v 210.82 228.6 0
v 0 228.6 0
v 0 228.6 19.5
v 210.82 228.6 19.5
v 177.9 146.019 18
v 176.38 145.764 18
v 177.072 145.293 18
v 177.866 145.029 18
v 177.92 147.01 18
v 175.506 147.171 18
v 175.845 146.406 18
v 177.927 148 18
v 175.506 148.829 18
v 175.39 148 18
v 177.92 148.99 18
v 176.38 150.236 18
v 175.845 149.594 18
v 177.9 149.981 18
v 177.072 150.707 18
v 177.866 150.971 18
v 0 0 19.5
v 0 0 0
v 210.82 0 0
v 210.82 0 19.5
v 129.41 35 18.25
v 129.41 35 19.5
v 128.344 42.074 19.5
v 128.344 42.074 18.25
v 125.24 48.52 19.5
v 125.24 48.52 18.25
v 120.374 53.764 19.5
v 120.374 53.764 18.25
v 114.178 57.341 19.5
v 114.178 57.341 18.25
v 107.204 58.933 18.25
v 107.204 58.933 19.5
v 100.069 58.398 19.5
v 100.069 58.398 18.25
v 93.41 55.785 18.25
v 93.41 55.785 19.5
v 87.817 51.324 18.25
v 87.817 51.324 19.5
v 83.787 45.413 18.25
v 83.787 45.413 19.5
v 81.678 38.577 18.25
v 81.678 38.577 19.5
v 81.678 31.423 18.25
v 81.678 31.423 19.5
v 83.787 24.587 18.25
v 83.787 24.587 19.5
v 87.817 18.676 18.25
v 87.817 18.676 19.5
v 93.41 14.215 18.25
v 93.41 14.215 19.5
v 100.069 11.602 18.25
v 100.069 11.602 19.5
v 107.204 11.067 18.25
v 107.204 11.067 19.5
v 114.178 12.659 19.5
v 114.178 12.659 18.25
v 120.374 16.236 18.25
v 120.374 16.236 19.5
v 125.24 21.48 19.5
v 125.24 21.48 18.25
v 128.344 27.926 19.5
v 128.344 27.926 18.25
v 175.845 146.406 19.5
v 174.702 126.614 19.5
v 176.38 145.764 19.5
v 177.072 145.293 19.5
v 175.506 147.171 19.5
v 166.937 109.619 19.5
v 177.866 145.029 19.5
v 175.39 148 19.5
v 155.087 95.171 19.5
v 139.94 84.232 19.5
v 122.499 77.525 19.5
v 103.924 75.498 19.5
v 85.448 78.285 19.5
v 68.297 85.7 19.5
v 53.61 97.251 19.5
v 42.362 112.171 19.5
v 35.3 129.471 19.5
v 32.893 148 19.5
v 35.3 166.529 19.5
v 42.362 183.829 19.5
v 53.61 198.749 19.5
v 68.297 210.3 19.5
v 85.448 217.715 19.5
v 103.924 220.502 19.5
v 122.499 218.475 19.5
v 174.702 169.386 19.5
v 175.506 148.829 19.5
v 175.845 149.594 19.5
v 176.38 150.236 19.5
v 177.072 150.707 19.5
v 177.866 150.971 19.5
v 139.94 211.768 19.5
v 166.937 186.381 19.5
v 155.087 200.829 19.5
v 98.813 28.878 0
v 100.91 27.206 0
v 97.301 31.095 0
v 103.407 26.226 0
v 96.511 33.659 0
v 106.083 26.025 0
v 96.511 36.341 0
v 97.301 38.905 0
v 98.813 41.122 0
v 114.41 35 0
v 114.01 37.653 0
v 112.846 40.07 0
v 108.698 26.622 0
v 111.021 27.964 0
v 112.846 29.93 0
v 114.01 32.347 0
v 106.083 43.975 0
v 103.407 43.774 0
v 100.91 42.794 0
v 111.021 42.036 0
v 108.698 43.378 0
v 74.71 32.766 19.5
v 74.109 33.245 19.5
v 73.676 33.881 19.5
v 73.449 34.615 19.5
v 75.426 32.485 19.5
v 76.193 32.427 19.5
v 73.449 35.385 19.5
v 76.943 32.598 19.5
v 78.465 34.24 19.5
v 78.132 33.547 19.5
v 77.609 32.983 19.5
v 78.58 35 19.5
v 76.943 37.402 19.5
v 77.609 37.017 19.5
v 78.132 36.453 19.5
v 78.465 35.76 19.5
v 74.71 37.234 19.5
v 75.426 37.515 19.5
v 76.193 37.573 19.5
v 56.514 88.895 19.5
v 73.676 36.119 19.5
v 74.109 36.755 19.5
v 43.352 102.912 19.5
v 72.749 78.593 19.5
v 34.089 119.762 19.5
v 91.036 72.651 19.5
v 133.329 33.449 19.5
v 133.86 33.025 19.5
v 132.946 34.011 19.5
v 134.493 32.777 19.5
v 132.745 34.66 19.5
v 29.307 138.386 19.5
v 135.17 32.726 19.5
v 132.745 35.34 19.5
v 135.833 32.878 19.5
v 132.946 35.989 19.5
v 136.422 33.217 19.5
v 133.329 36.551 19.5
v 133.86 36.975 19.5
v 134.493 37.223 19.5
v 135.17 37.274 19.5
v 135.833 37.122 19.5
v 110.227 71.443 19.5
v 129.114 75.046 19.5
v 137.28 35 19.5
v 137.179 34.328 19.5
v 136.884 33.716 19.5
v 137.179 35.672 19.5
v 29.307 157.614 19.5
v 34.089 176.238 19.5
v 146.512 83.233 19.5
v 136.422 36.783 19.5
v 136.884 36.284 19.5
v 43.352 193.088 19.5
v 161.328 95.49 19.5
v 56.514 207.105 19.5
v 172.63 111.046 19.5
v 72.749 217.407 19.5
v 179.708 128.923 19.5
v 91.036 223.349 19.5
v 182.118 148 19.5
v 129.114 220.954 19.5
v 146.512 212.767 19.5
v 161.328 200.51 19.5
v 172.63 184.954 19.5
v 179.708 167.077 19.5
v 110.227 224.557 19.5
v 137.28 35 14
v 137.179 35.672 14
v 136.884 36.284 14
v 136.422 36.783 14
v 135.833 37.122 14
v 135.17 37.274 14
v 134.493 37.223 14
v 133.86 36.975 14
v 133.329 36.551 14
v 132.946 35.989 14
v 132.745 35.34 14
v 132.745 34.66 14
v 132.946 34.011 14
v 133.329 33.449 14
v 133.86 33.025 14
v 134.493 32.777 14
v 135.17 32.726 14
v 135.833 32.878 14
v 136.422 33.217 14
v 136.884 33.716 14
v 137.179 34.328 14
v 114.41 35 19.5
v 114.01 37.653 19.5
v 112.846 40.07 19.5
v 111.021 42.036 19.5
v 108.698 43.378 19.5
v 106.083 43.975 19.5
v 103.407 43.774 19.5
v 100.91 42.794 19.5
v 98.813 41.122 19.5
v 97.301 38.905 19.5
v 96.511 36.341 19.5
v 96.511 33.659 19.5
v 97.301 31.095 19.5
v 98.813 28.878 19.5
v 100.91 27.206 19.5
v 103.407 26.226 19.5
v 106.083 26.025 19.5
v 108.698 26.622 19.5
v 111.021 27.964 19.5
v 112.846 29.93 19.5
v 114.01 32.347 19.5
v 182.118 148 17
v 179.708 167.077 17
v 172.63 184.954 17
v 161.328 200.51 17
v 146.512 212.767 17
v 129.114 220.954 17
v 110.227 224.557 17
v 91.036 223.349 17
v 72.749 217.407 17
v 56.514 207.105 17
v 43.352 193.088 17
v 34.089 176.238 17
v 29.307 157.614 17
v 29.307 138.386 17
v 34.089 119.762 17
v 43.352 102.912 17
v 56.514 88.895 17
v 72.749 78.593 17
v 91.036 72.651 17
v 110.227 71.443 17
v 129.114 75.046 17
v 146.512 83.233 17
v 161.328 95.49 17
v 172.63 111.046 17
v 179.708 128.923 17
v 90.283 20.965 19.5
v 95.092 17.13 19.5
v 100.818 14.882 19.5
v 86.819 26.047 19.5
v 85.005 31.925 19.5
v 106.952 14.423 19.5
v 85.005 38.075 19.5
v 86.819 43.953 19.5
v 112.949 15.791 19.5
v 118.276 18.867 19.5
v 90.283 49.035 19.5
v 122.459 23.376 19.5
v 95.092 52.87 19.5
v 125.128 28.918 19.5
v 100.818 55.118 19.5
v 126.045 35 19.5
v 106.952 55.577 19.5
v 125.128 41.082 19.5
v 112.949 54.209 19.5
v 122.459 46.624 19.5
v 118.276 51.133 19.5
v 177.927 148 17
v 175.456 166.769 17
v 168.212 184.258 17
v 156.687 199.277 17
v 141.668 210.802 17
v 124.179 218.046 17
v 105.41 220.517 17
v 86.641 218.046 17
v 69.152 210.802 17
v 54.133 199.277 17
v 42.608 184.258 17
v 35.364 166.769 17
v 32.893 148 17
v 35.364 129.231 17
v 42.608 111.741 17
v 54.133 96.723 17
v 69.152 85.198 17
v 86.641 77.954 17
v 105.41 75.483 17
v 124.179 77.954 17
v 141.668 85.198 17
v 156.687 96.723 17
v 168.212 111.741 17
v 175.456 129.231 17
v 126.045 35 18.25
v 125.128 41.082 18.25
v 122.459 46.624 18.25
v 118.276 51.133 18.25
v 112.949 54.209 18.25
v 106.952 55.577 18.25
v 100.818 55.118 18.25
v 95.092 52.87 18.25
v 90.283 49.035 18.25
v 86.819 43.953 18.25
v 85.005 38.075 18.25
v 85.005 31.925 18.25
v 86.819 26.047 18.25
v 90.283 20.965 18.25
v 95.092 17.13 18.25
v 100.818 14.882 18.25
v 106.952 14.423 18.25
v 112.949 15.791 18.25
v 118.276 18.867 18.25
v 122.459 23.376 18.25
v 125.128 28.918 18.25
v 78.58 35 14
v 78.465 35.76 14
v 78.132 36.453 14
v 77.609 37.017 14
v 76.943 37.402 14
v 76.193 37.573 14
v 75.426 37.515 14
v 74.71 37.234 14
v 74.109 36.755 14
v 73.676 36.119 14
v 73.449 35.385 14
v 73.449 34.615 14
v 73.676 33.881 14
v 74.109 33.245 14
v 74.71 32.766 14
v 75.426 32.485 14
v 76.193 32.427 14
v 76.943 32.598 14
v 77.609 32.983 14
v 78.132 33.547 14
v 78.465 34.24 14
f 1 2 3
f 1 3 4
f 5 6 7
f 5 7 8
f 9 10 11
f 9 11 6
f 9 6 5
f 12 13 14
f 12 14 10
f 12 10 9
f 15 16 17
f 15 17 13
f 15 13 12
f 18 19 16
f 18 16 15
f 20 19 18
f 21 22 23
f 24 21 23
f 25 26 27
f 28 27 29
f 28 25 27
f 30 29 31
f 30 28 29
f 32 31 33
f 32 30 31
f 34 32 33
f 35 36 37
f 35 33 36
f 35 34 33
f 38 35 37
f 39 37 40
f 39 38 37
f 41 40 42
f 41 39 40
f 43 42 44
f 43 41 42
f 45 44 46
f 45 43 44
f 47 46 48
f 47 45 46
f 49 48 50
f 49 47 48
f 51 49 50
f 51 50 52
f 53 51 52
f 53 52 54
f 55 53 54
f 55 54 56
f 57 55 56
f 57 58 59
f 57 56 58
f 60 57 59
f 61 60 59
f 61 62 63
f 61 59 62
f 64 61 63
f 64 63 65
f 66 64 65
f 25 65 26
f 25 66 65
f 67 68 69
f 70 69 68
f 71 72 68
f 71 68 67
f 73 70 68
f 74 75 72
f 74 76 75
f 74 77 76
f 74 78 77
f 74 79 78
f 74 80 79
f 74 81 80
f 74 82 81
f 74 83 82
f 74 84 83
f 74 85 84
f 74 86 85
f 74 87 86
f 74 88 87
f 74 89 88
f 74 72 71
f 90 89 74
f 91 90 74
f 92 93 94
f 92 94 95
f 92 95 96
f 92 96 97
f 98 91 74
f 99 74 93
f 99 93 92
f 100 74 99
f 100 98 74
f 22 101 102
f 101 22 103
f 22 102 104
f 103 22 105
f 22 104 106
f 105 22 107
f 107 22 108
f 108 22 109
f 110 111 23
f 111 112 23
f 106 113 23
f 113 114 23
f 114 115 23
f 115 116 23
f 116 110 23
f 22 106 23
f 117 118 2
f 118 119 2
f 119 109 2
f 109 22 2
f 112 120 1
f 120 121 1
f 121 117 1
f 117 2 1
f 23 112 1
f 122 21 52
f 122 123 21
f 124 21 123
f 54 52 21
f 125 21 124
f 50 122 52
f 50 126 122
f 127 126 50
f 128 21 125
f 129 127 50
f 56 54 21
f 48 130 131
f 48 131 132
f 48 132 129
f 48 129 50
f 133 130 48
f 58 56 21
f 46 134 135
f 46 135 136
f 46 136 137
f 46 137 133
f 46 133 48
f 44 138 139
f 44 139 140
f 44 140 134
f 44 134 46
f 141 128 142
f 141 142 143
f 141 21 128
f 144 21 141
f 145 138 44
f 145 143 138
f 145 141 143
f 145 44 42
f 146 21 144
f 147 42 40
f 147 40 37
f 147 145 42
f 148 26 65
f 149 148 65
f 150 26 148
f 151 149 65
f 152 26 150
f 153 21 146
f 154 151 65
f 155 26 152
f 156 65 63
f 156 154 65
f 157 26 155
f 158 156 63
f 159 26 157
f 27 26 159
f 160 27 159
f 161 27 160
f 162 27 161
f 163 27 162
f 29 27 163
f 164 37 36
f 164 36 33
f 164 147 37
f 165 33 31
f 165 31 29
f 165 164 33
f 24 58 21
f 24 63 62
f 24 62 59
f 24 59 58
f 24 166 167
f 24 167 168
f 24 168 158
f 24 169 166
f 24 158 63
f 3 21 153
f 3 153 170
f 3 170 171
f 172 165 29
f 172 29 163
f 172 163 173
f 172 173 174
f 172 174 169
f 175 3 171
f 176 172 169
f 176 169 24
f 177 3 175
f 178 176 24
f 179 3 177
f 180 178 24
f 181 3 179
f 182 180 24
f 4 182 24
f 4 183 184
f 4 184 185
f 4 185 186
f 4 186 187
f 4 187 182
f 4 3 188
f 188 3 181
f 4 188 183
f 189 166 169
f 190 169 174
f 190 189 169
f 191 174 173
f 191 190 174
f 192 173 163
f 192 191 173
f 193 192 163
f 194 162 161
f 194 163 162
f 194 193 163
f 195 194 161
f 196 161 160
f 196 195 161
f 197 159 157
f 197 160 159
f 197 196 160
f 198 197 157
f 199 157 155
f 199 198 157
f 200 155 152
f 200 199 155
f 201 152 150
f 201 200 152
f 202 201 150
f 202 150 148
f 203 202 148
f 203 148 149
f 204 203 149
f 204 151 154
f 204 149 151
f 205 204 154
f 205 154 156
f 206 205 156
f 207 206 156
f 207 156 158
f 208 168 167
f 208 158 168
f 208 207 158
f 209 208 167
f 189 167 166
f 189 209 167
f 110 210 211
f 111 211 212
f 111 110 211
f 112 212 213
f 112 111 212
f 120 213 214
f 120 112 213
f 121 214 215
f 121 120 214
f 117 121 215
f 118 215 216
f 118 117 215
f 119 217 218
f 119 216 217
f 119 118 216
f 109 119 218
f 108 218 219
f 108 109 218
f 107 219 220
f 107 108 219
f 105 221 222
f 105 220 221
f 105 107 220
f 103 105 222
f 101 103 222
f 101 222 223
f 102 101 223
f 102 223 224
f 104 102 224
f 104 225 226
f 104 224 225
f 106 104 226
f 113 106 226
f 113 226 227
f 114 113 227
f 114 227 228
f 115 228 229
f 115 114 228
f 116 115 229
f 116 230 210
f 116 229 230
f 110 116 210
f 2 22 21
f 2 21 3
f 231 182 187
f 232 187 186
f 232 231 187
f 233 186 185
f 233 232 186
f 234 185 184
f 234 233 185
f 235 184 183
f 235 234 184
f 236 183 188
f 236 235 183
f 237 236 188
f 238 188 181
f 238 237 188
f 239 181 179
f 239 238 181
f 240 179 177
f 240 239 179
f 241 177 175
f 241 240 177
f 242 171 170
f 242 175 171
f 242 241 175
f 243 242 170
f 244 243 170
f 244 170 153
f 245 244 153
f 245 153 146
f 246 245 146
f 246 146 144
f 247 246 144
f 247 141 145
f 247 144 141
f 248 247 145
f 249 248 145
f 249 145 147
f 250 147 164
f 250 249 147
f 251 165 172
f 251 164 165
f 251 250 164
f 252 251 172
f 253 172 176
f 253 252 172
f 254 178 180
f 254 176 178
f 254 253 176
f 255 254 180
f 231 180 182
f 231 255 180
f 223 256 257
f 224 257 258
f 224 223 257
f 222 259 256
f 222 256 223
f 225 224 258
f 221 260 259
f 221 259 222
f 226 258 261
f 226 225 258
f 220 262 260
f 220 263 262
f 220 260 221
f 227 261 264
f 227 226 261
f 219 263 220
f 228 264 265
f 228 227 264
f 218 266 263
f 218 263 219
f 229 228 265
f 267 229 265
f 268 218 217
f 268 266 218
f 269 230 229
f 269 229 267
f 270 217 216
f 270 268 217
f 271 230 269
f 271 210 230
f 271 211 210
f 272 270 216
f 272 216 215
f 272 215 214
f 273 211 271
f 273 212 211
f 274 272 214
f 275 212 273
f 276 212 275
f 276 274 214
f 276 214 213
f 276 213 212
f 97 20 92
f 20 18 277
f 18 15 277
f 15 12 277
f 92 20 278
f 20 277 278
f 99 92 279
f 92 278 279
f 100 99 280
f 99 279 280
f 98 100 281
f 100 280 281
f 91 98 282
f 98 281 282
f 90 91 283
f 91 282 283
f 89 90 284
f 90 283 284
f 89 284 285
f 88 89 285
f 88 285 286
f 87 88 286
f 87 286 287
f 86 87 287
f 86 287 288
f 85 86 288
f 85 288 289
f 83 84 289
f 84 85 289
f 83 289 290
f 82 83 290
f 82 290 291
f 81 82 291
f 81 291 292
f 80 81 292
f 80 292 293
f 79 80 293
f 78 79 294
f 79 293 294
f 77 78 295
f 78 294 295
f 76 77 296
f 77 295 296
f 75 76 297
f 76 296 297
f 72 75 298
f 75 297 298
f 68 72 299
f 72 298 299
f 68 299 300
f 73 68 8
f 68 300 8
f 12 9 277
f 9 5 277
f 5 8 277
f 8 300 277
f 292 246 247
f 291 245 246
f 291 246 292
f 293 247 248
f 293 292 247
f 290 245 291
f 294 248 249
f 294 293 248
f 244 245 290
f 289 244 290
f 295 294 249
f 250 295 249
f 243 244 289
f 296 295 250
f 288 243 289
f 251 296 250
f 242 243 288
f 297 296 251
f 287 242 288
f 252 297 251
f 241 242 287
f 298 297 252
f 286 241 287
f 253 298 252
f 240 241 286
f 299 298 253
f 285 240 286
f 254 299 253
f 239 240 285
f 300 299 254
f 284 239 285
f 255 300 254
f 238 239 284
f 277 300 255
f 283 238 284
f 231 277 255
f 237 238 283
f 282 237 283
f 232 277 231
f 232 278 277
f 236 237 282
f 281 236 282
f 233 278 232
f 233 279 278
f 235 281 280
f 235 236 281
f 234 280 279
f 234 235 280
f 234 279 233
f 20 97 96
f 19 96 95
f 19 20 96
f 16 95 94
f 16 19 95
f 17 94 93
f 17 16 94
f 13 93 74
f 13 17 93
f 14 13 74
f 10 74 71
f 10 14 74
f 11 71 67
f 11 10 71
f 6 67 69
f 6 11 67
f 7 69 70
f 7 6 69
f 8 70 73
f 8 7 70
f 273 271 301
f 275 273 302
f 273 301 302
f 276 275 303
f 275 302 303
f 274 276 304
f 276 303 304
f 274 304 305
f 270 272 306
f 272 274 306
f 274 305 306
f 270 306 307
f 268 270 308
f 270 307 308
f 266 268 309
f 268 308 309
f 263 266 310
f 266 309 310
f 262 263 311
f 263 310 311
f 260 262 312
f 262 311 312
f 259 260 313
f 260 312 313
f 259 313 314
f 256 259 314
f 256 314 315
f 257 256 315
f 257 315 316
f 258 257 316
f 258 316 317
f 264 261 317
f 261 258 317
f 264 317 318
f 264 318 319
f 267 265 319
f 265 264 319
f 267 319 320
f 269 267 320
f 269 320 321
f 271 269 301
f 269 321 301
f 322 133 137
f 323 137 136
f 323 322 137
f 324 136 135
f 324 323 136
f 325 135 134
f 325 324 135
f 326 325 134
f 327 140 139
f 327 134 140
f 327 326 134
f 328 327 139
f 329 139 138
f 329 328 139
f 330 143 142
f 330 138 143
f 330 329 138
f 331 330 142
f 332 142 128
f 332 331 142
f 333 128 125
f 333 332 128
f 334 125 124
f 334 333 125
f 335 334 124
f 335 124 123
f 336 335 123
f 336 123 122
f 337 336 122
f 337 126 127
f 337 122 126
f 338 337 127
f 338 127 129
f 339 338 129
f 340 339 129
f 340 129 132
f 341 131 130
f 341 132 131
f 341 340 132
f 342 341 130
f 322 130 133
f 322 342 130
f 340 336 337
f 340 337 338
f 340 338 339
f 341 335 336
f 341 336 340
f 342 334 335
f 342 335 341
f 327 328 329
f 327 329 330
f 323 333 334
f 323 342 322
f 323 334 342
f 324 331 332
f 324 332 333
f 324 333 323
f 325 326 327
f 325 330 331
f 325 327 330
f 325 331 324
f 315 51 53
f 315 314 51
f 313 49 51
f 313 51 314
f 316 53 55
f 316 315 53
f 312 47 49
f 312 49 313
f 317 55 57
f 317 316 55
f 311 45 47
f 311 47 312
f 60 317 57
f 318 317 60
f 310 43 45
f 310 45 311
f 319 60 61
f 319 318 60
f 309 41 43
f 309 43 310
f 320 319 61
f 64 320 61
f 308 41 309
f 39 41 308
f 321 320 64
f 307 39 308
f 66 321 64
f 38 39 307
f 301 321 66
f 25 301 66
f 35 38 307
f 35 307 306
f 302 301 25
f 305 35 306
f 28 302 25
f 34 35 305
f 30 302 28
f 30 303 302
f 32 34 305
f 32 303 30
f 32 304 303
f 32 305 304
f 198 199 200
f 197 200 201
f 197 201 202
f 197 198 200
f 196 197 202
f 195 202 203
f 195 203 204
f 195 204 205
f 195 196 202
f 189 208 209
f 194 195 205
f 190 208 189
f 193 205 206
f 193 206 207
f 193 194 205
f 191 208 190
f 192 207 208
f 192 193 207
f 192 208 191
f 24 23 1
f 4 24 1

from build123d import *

# Parameters (mm, degrees)
CYLINDER163_R     = 2.58
CYLINDER163_DEPTH = 29
CYLINDER161_R     = 72.517
CYLINDER161_DEPTH = 3
CYLINDER160_R     = 76.708
CYLINDER160_DEPTH = 3
CYLINDER162_R     = 3.02
CYLINDER162_DEPTH = 2
CYLINDER159_R     = 9
CYLINDER159_DEPTH = 21
CYLINDER158_R     = 20.635
CYLINDER158_DEPTH = 41.275
CYLINDER157_R     = 24
CYLINDER157_DEPTH = 3.175
CYLINDER164_R     = 2.28
CYLINDER164_DEPTH = 29
BOX_W             = 210.82
BOX_H             = 228.6
BOX_DEPTH         = 19.5


with BuildPart() as cylinder015:
    # Cylinder163 → Cylinder163 (new body)
    with BuildSketch(Plane(origin=(76, 35, 14), x_dir=(1, 0, 0), z_dir=(0, 0, 1))):
        Circle(CYLINDER163_R)
    extrude(amount=CYLINDER163_DEPTH)


with BuildPart() as cylinder013:
    # Cylinder161 → Cylinder161 (new body)
    with BuildSketch(Plane(origin=(105.41, 148, 17), x_dir=(1, 0, 0), z_dir=(0, 0, 1))):
        Circle(CYLINDER161_R)
    extrude(amount=CYLINDER161_DEPTH)


with BuildPart() as cut021:
    # Cylinder160 → Cylinder160 (new body)
    with BuildSketch(Plane(origin=(105.41, 148, 17), x_dir=(1, 0, 0), z_dir=(0, 0, 1))):
        Circle(CYLINDER160_R)
    extrude(amount=CYLINDER160_DEPTH)

    # Cut021: cut Cylinder013
    add(cylinder013.part, mode=Mode.SUBTRACT)


with BuildPart() as cylinder014:
    # Cylinder162 → Cylinder162 (new body)
    with BuildSketch(Plane(origin=(178.41, 148, 18), x_dir=(1, 0, 0), z_dir=(0, 0, 1))):
        Circle(CYLINDER162_R)
    extrude(amount=CYLINDER162_DEPTH)


with BuildPart() as cylinder011:
    # Cylinder159 → Cylinder159 (new body)
    with BuildSketch(Plane(origin=(105.41, 35, 0), x_dir=(1, 0, 0), z_dir=(0, 0, 1))):
        Circle(CYLINDER159_R)
    extrude(amount=CYLINDER159_DEPTH)


with BuildPart() as cylinder010:
    # Cylinder158 → Cylinder158 (new body)
    with BuildSketch(Plane.XY):
        Circle(CYLINDER158_R)
    extrude(amount=CYLINDER158_DEPTH)


with BuildPart() as cut020:
    # Cylinder157 → Cylinder157 (new body)
    with BuildSketch(Plane.XY):
        Circle(CYLINDER157_R)
    extrude(amount=CYLINDER157_DEPTH)

    # Cut020: cut Cylinder010
    add(cylinder010.part, mode=Mode.SUBTRACT)


with BuildPart() as cut020_1:
    # Cut020 placement: moved
    add(cut020.part.moved(Location((105.41, 35, 18.25))))


with BuildPart() as fusion058:
    # Cylinder164 → Cylinder164 (new body)
    with BuildSketch(Plane(origin=(135, 35, 14), x_dir=(1, 0, 0), z_dir=(0, 0, 1))):
        Circle(CYLINDER164_R)
    extrude(amount=CYLINDER164_DEPTH)

    # Fusion058: union Cylinder015, Cut021, Cylinder014, Cylinder011, Cut020
    add(cylinder015.part)
    add(cut021.part)
    add(cylinder014.part)
    add(cylinder011.part)
    add(cut020_1.part)


with BuildPart() as base_cut022:
    # Box → Box (new body)
    with BuildSketch(Plane.XY):
        with Locations((105.41, 114.3)):
            Rectangle(BOX_W, BOX_H)
    extrude(amount=BOX_DEPTH)

    # Cut022: cut Fusion058
    add(fusion058.part, mode=Mode.SUBTRACT)


solid = base_cut022.part
